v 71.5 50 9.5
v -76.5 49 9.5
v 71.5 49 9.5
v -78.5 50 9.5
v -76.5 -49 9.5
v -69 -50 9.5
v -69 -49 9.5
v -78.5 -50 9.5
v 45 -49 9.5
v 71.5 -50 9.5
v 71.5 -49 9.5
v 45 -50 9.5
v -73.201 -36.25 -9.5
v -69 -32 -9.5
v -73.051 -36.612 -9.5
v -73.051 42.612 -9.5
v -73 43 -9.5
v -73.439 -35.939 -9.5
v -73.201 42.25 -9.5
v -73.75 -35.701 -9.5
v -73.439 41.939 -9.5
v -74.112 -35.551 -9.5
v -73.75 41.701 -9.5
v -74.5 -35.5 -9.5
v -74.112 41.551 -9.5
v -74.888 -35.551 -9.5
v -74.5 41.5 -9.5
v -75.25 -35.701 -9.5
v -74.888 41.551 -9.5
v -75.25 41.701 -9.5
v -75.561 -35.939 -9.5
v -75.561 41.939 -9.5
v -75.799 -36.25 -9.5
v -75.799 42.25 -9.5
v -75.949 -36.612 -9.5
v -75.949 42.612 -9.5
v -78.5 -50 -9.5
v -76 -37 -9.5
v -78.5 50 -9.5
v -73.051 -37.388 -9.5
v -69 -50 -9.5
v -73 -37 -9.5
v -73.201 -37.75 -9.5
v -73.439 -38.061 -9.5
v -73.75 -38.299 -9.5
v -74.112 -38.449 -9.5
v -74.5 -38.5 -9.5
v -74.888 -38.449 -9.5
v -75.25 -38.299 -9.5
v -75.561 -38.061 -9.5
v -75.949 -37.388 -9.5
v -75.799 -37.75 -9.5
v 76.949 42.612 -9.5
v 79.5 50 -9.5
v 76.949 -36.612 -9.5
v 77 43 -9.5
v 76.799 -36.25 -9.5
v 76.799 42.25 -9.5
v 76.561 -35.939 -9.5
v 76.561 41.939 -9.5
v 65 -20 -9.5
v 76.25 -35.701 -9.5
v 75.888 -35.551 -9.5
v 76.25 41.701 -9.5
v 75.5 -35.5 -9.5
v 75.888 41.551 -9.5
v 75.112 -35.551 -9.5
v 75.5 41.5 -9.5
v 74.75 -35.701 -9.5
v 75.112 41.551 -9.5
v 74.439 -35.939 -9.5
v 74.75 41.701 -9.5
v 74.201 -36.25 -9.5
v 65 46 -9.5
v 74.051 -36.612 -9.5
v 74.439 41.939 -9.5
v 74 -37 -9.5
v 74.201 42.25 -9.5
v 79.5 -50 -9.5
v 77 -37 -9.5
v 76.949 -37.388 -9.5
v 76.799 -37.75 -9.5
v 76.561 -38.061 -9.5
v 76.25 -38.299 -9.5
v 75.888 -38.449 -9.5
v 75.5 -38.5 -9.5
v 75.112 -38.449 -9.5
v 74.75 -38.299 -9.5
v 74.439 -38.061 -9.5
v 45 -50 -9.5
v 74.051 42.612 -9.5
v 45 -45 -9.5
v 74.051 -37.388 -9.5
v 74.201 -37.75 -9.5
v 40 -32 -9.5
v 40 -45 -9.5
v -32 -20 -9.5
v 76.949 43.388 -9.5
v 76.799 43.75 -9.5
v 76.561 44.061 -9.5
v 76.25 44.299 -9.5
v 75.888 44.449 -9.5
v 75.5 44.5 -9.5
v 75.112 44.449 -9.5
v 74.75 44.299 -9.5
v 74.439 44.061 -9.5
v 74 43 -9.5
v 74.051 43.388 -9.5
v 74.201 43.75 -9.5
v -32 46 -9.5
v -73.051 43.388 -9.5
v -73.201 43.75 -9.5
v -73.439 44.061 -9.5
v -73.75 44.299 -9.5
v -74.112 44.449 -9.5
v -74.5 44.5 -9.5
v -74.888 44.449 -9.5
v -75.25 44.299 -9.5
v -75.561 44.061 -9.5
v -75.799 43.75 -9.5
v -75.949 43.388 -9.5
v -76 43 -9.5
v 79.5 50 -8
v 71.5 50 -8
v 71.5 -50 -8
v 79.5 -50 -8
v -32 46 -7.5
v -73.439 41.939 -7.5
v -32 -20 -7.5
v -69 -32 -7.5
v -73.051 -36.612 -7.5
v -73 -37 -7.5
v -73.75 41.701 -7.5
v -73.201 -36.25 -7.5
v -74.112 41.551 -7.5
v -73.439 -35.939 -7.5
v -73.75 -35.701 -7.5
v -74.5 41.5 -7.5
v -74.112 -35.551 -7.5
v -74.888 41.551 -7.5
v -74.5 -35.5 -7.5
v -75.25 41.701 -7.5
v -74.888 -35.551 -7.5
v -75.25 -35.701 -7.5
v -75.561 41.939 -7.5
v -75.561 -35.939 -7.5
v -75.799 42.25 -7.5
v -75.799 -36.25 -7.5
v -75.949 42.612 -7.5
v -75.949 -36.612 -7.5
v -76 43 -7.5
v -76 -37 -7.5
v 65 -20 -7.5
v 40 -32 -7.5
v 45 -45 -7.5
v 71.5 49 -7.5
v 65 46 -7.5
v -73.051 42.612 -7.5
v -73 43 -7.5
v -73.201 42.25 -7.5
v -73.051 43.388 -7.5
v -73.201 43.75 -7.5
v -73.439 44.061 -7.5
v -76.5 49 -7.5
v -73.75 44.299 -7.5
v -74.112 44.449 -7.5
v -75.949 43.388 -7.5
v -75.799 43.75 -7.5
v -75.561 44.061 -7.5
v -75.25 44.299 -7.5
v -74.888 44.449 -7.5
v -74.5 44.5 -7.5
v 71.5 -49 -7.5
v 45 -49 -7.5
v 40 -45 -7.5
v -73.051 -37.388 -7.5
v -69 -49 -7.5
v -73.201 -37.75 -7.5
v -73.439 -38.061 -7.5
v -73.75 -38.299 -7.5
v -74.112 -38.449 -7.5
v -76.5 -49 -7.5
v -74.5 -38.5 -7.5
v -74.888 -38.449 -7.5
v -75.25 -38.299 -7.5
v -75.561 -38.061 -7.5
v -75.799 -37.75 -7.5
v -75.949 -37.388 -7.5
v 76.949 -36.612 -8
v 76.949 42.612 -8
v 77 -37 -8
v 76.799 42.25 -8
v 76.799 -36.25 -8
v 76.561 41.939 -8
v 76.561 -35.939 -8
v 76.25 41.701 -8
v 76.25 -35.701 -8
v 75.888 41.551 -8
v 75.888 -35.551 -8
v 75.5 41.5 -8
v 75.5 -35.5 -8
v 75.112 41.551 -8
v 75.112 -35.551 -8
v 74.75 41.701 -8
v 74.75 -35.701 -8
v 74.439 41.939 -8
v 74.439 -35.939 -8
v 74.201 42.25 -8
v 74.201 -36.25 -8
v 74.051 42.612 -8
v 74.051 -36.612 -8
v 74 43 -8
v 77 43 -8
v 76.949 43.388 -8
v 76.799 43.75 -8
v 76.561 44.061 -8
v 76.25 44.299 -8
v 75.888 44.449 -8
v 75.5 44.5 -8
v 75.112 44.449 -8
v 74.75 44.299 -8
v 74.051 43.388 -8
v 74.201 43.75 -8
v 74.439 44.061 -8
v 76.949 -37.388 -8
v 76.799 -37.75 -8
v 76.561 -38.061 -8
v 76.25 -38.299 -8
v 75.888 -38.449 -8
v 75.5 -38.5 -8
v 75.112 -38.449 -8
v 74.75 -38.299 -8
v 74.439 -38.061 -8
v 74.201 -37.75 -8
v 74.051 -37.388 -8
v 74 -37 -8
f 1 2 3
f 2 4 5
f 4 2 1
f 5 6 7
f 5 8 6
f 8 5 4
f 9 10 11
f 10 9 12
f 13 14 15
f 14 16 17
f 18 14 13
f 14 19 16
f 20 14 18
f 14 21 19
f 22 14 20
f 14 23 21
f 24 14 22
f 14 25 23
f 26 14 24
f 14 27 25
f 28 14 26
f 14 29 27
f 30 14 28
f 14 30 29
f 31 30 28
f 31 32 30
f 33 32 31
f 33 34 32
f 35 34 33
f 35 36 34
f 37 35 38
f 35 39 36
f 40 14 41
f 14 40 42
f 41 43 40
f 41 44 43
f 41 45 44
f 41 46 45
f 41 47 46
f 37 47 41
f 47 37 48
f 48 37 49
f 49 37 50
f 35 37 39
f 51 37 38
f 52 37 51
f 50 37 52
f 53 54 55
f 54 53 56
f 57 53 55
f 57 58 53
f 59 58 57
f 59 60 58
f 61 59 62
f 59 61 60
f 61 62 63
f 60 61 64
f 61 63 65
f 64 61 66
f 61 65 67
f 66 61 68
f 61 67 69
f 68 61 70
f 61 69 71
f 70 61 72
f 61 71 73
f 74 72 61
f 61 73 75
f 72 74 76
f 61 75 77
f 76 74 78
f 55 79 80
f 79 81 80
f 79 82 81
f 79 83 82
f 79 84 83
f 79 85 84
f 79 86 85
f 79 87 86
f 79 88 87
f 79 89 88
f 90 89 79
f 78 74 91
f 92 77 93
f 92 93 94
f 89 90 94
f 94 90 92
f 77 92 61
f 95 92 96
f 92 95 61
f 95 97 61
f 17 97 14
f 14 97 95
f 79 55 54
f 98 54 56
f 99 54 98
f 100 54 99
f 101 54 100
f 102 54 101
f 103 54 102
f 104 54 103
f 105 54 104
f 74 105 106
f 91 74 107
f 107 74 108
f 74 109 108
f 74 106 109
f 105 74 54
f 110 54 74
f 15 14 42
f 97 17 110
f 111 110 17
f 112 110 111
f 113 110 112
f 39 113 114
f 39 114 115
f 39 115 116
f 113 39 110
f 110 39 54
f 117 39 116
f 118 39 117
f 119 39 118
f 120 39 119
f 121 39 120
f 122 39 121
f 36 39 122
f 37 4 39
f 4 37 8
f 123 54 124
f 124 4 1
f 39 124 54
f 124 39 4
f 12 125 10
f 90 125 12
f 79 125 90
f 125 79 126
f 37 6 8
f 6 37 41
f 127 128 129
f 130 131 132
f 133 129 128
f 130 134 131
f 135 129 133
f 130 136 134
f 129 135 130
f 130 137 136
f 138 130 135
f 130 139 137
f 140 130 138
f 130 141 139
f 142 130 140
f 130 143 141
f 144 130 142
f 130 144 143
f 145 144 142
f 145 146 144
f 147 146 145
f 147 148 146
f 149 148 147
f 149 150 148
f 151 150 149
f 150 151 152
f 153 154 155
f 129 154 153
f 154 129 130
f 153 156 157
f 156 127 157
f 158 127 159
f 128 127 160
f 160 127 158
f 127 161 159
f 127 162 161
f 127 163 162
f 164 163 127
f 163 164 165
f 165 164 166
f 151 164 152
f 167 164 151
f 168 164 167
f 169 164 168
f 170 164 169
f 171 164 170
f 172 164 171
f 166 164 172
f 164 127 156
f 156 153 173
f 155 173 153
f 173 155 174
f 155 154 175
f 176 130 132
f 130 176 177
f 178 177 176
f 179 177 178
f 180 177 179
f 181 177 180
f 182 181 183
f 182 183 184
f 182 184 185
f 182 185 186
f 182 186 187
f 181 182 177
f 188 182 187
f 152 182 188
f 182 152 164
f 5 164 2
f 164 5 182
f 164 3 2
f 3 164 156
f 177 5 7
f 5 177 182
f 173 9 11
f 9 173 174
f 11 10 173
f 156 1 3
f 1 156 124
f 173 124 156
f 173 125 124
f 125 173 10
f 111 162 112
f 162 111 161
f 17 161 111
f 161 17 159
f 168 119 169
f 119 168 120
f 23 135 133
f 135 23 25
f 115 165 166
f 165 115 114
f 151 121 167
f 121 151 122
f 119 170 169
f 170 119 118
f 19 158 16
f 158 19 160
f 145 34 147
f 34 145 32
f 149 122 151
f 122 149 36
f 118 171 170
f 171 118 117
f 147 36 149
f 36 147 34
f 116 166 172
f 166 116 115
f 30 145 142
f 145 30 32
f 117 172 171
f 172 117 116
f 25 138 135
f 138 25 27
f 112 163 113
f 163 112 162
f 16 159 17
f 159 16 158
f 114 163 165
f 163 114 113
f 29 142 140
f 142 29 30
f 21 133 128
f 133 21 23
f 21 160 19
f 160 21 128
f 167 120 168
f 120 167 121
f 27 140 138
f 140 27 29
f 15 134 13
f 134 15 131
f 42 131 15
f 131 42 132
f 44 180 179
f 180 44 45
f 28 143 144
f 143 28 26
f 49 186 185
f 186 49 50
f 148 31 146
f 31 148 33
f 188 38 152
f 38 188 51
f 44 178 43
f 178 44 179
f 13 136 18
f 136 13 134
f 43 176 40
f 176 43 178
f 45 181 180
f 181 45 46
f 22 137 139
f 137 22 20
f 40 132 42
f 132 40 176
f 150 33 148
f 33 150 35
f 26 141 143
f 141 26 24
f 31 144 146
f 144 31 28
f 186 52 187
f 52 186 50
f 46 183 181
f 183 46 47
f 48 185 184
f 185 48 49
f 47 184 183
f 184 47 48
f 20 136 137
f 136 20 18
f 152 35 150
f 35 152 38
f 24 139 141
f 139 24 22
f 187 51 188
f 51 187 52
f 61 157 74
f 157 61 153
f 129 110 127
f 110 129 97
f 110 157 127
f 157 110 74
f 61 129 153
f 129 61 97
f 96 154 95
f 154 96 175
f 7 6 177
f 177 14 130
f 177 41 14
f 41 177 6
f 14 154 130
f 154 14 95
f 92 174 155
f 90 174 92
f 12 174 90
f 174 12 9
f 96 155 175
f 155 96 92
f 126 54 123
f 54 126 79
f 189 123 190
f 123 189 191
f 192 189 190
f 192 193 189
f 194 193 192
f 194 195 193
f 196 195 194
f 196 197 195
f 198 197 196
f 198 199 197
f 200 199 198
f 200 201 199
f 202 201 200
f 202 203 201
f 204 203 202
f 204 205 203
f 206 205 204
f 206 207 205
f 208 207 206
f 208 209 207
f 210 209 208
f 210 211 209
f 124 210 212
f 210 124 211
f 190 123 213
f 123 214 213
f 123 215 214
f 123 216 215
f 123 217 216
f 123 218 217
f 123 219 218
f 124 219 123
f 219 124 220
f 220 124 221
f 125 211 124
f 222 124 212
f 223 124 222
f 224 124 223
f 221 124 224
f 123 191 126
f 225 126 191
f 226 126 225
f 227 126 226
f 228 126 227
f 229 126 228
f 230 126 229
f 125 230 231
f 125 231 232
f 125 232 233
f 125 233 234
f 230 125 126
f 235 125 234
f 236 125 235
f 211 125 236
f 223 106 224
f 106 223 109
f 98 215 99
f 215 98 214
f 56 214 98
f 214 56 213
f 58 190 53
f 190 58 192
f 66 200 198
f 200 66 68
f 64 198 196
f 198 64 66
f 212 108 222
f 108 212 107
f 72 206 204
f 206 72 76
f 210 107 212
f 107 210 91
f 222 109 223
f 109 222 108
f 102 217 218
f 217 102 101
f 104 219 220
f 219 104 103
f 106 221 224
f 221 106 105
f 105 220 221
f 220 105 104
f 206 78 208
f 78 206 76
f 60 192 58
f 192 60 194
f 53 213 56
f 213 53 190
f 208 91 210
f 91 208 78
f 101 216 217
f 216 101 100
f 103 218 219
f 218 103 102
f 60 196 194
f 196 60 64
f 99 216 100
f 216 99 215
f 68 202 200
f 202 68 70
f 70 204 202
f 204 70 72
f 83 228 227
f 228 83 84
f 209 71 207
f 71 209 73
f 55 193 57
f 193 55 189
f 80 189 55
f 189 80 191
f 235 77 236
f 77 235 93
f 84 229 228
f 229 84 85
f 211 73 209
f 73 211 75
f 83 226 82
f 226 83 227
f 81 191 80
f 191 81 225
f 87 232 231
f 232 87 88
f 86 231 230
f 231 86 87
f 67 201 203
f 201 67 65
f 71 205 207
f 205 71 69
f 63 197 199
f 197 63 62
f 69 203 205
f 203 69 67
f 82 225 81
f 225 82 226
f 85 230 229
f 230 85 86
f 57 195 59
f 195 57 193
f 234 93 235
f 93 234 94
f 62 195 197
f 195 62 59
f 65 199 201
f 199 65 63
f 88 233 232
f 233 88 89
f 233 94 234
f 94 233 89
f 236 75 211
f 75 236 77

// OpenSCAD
$fa = 1;
$fs = 0.4;

video = false;
touchscreen = true;
both = false;
if (video == true) {
    video_plate();
}
if (touchscreen == true) {
    // translate([-26.25, -44, 0]) // checking horizontal alignment of standoff holes
    // translate([74.5, -43, 0]) // checking vertical alignment of standoff holes
        touchscreen_plate();
}

if (both == true) {
    video_plate();
    translate([-106, 0, -0.5])
        touchscreen_plate();
}


vpl = 69;
vpw = 100;
vph = 16;

module video_plate() {
    union() {
        difference() {
            cube([vpl,vpw,vph], center=true);  // outer cube
            translate([0, 0, 2])
                cube([vpl - 2, vpw - 2, vph], center=true);  // inner cube
            translate([-(vpl/2) + 4, 0, 1])
                cube([15, vpw, vph], center=true); // cut out for adjoining plates
            translate([(vpl/2) - 42, -(vpw/ 2), 0])
                cube([vpl, 10, 26], center=true); // power, HDMI, USB-C
            translate([-(vpl/2) + 65, (vpw/2) - 7, -vph / 2])
                cylinder(d=3, h=3); // top stand side standoff hole
            translate([-(vpl/2) + 65, (vpw/2) - 87, -vph / 2])
                cylinder(d=3, h=3); // bottom stand side standoff hole
            translate([-(vpl/2) + 5, (vpw/2) - 7, -vph / 2])
                cylinder(d=3, h=3); // top video board pi side standoff hole
            translate([-(vpl/2) + 5, (vpw/2) - 87, -vph / 2])
                cylinder(d=3, h=3); // bottom video board pi side standoff hole
            translate([(vpl/2),(vpw/2)-20,1.5])
                cube([3, 15, 15], center=true); // access to power button on video parent_module
        }
        translate([-(vpl/2)+ 5.75,-(vpw/2) + 3,-7.5])
            cube([11.5,5,1], center=true);
    }
}

tpl = 157;
tpw = 100;
tph = 19;
module touchscreen_plate() {
    union() {
        difference() {
            cube([tpl, tpw, tph], center=true); // outer cube
            translate([1, 0, 2])
                cube([tpl-2, tpw-2, tph], center=true); // inner cube
            translate([tpl/2 - 2, 0 , 0])
                cube([10, tpw, tph], center=true); // cut off 10 cm lip
            translate([-(tpl/2) + 4, (tpw/2) - 7, -(tph/2)])
                cylinder(d=3, h=3); // top stand side standoff hole
            translate([-(tpl/2) + 4, (tpw/2) - 87, -(tph/2)])
                cylinder(d=3, h=3); // bottom stand side standoff hole
            translate([-(tpl/2) + 95, (tpw/2) - 37, -9])
                color("green") cube([97, 66, 4], center=true);  // Raspberry Pi
            translate([(-tpl/2) + 64, (-tpw/2) + 9, 0])
                color("red") cube([109, 18, tph], center=true); // slot for portable battery
            translate([tpl/2 - 36, -tpw/2, 0])
                color("blue") cube([5, 10, tph], center=true);   // cut out to get to power switch
        }
        difference() {
            translate([tpl/2 - 4, 0 , -8.75])
                cube([10, tpw, 1.5], center=true); //  lip where cover connects to video side
            translate([-(tpl/2) + 154 , (tpw/2) - 7, -(tph/2)])
                cylinder(d=3, h=3); // pi side video top standoff hole
            translate([-(tpl/2) + 154 , (tpw/2) - 87, -(tph/2)])
                cylinder(d=3, h=3); // pi side video standoff hole
        }
    }
}
